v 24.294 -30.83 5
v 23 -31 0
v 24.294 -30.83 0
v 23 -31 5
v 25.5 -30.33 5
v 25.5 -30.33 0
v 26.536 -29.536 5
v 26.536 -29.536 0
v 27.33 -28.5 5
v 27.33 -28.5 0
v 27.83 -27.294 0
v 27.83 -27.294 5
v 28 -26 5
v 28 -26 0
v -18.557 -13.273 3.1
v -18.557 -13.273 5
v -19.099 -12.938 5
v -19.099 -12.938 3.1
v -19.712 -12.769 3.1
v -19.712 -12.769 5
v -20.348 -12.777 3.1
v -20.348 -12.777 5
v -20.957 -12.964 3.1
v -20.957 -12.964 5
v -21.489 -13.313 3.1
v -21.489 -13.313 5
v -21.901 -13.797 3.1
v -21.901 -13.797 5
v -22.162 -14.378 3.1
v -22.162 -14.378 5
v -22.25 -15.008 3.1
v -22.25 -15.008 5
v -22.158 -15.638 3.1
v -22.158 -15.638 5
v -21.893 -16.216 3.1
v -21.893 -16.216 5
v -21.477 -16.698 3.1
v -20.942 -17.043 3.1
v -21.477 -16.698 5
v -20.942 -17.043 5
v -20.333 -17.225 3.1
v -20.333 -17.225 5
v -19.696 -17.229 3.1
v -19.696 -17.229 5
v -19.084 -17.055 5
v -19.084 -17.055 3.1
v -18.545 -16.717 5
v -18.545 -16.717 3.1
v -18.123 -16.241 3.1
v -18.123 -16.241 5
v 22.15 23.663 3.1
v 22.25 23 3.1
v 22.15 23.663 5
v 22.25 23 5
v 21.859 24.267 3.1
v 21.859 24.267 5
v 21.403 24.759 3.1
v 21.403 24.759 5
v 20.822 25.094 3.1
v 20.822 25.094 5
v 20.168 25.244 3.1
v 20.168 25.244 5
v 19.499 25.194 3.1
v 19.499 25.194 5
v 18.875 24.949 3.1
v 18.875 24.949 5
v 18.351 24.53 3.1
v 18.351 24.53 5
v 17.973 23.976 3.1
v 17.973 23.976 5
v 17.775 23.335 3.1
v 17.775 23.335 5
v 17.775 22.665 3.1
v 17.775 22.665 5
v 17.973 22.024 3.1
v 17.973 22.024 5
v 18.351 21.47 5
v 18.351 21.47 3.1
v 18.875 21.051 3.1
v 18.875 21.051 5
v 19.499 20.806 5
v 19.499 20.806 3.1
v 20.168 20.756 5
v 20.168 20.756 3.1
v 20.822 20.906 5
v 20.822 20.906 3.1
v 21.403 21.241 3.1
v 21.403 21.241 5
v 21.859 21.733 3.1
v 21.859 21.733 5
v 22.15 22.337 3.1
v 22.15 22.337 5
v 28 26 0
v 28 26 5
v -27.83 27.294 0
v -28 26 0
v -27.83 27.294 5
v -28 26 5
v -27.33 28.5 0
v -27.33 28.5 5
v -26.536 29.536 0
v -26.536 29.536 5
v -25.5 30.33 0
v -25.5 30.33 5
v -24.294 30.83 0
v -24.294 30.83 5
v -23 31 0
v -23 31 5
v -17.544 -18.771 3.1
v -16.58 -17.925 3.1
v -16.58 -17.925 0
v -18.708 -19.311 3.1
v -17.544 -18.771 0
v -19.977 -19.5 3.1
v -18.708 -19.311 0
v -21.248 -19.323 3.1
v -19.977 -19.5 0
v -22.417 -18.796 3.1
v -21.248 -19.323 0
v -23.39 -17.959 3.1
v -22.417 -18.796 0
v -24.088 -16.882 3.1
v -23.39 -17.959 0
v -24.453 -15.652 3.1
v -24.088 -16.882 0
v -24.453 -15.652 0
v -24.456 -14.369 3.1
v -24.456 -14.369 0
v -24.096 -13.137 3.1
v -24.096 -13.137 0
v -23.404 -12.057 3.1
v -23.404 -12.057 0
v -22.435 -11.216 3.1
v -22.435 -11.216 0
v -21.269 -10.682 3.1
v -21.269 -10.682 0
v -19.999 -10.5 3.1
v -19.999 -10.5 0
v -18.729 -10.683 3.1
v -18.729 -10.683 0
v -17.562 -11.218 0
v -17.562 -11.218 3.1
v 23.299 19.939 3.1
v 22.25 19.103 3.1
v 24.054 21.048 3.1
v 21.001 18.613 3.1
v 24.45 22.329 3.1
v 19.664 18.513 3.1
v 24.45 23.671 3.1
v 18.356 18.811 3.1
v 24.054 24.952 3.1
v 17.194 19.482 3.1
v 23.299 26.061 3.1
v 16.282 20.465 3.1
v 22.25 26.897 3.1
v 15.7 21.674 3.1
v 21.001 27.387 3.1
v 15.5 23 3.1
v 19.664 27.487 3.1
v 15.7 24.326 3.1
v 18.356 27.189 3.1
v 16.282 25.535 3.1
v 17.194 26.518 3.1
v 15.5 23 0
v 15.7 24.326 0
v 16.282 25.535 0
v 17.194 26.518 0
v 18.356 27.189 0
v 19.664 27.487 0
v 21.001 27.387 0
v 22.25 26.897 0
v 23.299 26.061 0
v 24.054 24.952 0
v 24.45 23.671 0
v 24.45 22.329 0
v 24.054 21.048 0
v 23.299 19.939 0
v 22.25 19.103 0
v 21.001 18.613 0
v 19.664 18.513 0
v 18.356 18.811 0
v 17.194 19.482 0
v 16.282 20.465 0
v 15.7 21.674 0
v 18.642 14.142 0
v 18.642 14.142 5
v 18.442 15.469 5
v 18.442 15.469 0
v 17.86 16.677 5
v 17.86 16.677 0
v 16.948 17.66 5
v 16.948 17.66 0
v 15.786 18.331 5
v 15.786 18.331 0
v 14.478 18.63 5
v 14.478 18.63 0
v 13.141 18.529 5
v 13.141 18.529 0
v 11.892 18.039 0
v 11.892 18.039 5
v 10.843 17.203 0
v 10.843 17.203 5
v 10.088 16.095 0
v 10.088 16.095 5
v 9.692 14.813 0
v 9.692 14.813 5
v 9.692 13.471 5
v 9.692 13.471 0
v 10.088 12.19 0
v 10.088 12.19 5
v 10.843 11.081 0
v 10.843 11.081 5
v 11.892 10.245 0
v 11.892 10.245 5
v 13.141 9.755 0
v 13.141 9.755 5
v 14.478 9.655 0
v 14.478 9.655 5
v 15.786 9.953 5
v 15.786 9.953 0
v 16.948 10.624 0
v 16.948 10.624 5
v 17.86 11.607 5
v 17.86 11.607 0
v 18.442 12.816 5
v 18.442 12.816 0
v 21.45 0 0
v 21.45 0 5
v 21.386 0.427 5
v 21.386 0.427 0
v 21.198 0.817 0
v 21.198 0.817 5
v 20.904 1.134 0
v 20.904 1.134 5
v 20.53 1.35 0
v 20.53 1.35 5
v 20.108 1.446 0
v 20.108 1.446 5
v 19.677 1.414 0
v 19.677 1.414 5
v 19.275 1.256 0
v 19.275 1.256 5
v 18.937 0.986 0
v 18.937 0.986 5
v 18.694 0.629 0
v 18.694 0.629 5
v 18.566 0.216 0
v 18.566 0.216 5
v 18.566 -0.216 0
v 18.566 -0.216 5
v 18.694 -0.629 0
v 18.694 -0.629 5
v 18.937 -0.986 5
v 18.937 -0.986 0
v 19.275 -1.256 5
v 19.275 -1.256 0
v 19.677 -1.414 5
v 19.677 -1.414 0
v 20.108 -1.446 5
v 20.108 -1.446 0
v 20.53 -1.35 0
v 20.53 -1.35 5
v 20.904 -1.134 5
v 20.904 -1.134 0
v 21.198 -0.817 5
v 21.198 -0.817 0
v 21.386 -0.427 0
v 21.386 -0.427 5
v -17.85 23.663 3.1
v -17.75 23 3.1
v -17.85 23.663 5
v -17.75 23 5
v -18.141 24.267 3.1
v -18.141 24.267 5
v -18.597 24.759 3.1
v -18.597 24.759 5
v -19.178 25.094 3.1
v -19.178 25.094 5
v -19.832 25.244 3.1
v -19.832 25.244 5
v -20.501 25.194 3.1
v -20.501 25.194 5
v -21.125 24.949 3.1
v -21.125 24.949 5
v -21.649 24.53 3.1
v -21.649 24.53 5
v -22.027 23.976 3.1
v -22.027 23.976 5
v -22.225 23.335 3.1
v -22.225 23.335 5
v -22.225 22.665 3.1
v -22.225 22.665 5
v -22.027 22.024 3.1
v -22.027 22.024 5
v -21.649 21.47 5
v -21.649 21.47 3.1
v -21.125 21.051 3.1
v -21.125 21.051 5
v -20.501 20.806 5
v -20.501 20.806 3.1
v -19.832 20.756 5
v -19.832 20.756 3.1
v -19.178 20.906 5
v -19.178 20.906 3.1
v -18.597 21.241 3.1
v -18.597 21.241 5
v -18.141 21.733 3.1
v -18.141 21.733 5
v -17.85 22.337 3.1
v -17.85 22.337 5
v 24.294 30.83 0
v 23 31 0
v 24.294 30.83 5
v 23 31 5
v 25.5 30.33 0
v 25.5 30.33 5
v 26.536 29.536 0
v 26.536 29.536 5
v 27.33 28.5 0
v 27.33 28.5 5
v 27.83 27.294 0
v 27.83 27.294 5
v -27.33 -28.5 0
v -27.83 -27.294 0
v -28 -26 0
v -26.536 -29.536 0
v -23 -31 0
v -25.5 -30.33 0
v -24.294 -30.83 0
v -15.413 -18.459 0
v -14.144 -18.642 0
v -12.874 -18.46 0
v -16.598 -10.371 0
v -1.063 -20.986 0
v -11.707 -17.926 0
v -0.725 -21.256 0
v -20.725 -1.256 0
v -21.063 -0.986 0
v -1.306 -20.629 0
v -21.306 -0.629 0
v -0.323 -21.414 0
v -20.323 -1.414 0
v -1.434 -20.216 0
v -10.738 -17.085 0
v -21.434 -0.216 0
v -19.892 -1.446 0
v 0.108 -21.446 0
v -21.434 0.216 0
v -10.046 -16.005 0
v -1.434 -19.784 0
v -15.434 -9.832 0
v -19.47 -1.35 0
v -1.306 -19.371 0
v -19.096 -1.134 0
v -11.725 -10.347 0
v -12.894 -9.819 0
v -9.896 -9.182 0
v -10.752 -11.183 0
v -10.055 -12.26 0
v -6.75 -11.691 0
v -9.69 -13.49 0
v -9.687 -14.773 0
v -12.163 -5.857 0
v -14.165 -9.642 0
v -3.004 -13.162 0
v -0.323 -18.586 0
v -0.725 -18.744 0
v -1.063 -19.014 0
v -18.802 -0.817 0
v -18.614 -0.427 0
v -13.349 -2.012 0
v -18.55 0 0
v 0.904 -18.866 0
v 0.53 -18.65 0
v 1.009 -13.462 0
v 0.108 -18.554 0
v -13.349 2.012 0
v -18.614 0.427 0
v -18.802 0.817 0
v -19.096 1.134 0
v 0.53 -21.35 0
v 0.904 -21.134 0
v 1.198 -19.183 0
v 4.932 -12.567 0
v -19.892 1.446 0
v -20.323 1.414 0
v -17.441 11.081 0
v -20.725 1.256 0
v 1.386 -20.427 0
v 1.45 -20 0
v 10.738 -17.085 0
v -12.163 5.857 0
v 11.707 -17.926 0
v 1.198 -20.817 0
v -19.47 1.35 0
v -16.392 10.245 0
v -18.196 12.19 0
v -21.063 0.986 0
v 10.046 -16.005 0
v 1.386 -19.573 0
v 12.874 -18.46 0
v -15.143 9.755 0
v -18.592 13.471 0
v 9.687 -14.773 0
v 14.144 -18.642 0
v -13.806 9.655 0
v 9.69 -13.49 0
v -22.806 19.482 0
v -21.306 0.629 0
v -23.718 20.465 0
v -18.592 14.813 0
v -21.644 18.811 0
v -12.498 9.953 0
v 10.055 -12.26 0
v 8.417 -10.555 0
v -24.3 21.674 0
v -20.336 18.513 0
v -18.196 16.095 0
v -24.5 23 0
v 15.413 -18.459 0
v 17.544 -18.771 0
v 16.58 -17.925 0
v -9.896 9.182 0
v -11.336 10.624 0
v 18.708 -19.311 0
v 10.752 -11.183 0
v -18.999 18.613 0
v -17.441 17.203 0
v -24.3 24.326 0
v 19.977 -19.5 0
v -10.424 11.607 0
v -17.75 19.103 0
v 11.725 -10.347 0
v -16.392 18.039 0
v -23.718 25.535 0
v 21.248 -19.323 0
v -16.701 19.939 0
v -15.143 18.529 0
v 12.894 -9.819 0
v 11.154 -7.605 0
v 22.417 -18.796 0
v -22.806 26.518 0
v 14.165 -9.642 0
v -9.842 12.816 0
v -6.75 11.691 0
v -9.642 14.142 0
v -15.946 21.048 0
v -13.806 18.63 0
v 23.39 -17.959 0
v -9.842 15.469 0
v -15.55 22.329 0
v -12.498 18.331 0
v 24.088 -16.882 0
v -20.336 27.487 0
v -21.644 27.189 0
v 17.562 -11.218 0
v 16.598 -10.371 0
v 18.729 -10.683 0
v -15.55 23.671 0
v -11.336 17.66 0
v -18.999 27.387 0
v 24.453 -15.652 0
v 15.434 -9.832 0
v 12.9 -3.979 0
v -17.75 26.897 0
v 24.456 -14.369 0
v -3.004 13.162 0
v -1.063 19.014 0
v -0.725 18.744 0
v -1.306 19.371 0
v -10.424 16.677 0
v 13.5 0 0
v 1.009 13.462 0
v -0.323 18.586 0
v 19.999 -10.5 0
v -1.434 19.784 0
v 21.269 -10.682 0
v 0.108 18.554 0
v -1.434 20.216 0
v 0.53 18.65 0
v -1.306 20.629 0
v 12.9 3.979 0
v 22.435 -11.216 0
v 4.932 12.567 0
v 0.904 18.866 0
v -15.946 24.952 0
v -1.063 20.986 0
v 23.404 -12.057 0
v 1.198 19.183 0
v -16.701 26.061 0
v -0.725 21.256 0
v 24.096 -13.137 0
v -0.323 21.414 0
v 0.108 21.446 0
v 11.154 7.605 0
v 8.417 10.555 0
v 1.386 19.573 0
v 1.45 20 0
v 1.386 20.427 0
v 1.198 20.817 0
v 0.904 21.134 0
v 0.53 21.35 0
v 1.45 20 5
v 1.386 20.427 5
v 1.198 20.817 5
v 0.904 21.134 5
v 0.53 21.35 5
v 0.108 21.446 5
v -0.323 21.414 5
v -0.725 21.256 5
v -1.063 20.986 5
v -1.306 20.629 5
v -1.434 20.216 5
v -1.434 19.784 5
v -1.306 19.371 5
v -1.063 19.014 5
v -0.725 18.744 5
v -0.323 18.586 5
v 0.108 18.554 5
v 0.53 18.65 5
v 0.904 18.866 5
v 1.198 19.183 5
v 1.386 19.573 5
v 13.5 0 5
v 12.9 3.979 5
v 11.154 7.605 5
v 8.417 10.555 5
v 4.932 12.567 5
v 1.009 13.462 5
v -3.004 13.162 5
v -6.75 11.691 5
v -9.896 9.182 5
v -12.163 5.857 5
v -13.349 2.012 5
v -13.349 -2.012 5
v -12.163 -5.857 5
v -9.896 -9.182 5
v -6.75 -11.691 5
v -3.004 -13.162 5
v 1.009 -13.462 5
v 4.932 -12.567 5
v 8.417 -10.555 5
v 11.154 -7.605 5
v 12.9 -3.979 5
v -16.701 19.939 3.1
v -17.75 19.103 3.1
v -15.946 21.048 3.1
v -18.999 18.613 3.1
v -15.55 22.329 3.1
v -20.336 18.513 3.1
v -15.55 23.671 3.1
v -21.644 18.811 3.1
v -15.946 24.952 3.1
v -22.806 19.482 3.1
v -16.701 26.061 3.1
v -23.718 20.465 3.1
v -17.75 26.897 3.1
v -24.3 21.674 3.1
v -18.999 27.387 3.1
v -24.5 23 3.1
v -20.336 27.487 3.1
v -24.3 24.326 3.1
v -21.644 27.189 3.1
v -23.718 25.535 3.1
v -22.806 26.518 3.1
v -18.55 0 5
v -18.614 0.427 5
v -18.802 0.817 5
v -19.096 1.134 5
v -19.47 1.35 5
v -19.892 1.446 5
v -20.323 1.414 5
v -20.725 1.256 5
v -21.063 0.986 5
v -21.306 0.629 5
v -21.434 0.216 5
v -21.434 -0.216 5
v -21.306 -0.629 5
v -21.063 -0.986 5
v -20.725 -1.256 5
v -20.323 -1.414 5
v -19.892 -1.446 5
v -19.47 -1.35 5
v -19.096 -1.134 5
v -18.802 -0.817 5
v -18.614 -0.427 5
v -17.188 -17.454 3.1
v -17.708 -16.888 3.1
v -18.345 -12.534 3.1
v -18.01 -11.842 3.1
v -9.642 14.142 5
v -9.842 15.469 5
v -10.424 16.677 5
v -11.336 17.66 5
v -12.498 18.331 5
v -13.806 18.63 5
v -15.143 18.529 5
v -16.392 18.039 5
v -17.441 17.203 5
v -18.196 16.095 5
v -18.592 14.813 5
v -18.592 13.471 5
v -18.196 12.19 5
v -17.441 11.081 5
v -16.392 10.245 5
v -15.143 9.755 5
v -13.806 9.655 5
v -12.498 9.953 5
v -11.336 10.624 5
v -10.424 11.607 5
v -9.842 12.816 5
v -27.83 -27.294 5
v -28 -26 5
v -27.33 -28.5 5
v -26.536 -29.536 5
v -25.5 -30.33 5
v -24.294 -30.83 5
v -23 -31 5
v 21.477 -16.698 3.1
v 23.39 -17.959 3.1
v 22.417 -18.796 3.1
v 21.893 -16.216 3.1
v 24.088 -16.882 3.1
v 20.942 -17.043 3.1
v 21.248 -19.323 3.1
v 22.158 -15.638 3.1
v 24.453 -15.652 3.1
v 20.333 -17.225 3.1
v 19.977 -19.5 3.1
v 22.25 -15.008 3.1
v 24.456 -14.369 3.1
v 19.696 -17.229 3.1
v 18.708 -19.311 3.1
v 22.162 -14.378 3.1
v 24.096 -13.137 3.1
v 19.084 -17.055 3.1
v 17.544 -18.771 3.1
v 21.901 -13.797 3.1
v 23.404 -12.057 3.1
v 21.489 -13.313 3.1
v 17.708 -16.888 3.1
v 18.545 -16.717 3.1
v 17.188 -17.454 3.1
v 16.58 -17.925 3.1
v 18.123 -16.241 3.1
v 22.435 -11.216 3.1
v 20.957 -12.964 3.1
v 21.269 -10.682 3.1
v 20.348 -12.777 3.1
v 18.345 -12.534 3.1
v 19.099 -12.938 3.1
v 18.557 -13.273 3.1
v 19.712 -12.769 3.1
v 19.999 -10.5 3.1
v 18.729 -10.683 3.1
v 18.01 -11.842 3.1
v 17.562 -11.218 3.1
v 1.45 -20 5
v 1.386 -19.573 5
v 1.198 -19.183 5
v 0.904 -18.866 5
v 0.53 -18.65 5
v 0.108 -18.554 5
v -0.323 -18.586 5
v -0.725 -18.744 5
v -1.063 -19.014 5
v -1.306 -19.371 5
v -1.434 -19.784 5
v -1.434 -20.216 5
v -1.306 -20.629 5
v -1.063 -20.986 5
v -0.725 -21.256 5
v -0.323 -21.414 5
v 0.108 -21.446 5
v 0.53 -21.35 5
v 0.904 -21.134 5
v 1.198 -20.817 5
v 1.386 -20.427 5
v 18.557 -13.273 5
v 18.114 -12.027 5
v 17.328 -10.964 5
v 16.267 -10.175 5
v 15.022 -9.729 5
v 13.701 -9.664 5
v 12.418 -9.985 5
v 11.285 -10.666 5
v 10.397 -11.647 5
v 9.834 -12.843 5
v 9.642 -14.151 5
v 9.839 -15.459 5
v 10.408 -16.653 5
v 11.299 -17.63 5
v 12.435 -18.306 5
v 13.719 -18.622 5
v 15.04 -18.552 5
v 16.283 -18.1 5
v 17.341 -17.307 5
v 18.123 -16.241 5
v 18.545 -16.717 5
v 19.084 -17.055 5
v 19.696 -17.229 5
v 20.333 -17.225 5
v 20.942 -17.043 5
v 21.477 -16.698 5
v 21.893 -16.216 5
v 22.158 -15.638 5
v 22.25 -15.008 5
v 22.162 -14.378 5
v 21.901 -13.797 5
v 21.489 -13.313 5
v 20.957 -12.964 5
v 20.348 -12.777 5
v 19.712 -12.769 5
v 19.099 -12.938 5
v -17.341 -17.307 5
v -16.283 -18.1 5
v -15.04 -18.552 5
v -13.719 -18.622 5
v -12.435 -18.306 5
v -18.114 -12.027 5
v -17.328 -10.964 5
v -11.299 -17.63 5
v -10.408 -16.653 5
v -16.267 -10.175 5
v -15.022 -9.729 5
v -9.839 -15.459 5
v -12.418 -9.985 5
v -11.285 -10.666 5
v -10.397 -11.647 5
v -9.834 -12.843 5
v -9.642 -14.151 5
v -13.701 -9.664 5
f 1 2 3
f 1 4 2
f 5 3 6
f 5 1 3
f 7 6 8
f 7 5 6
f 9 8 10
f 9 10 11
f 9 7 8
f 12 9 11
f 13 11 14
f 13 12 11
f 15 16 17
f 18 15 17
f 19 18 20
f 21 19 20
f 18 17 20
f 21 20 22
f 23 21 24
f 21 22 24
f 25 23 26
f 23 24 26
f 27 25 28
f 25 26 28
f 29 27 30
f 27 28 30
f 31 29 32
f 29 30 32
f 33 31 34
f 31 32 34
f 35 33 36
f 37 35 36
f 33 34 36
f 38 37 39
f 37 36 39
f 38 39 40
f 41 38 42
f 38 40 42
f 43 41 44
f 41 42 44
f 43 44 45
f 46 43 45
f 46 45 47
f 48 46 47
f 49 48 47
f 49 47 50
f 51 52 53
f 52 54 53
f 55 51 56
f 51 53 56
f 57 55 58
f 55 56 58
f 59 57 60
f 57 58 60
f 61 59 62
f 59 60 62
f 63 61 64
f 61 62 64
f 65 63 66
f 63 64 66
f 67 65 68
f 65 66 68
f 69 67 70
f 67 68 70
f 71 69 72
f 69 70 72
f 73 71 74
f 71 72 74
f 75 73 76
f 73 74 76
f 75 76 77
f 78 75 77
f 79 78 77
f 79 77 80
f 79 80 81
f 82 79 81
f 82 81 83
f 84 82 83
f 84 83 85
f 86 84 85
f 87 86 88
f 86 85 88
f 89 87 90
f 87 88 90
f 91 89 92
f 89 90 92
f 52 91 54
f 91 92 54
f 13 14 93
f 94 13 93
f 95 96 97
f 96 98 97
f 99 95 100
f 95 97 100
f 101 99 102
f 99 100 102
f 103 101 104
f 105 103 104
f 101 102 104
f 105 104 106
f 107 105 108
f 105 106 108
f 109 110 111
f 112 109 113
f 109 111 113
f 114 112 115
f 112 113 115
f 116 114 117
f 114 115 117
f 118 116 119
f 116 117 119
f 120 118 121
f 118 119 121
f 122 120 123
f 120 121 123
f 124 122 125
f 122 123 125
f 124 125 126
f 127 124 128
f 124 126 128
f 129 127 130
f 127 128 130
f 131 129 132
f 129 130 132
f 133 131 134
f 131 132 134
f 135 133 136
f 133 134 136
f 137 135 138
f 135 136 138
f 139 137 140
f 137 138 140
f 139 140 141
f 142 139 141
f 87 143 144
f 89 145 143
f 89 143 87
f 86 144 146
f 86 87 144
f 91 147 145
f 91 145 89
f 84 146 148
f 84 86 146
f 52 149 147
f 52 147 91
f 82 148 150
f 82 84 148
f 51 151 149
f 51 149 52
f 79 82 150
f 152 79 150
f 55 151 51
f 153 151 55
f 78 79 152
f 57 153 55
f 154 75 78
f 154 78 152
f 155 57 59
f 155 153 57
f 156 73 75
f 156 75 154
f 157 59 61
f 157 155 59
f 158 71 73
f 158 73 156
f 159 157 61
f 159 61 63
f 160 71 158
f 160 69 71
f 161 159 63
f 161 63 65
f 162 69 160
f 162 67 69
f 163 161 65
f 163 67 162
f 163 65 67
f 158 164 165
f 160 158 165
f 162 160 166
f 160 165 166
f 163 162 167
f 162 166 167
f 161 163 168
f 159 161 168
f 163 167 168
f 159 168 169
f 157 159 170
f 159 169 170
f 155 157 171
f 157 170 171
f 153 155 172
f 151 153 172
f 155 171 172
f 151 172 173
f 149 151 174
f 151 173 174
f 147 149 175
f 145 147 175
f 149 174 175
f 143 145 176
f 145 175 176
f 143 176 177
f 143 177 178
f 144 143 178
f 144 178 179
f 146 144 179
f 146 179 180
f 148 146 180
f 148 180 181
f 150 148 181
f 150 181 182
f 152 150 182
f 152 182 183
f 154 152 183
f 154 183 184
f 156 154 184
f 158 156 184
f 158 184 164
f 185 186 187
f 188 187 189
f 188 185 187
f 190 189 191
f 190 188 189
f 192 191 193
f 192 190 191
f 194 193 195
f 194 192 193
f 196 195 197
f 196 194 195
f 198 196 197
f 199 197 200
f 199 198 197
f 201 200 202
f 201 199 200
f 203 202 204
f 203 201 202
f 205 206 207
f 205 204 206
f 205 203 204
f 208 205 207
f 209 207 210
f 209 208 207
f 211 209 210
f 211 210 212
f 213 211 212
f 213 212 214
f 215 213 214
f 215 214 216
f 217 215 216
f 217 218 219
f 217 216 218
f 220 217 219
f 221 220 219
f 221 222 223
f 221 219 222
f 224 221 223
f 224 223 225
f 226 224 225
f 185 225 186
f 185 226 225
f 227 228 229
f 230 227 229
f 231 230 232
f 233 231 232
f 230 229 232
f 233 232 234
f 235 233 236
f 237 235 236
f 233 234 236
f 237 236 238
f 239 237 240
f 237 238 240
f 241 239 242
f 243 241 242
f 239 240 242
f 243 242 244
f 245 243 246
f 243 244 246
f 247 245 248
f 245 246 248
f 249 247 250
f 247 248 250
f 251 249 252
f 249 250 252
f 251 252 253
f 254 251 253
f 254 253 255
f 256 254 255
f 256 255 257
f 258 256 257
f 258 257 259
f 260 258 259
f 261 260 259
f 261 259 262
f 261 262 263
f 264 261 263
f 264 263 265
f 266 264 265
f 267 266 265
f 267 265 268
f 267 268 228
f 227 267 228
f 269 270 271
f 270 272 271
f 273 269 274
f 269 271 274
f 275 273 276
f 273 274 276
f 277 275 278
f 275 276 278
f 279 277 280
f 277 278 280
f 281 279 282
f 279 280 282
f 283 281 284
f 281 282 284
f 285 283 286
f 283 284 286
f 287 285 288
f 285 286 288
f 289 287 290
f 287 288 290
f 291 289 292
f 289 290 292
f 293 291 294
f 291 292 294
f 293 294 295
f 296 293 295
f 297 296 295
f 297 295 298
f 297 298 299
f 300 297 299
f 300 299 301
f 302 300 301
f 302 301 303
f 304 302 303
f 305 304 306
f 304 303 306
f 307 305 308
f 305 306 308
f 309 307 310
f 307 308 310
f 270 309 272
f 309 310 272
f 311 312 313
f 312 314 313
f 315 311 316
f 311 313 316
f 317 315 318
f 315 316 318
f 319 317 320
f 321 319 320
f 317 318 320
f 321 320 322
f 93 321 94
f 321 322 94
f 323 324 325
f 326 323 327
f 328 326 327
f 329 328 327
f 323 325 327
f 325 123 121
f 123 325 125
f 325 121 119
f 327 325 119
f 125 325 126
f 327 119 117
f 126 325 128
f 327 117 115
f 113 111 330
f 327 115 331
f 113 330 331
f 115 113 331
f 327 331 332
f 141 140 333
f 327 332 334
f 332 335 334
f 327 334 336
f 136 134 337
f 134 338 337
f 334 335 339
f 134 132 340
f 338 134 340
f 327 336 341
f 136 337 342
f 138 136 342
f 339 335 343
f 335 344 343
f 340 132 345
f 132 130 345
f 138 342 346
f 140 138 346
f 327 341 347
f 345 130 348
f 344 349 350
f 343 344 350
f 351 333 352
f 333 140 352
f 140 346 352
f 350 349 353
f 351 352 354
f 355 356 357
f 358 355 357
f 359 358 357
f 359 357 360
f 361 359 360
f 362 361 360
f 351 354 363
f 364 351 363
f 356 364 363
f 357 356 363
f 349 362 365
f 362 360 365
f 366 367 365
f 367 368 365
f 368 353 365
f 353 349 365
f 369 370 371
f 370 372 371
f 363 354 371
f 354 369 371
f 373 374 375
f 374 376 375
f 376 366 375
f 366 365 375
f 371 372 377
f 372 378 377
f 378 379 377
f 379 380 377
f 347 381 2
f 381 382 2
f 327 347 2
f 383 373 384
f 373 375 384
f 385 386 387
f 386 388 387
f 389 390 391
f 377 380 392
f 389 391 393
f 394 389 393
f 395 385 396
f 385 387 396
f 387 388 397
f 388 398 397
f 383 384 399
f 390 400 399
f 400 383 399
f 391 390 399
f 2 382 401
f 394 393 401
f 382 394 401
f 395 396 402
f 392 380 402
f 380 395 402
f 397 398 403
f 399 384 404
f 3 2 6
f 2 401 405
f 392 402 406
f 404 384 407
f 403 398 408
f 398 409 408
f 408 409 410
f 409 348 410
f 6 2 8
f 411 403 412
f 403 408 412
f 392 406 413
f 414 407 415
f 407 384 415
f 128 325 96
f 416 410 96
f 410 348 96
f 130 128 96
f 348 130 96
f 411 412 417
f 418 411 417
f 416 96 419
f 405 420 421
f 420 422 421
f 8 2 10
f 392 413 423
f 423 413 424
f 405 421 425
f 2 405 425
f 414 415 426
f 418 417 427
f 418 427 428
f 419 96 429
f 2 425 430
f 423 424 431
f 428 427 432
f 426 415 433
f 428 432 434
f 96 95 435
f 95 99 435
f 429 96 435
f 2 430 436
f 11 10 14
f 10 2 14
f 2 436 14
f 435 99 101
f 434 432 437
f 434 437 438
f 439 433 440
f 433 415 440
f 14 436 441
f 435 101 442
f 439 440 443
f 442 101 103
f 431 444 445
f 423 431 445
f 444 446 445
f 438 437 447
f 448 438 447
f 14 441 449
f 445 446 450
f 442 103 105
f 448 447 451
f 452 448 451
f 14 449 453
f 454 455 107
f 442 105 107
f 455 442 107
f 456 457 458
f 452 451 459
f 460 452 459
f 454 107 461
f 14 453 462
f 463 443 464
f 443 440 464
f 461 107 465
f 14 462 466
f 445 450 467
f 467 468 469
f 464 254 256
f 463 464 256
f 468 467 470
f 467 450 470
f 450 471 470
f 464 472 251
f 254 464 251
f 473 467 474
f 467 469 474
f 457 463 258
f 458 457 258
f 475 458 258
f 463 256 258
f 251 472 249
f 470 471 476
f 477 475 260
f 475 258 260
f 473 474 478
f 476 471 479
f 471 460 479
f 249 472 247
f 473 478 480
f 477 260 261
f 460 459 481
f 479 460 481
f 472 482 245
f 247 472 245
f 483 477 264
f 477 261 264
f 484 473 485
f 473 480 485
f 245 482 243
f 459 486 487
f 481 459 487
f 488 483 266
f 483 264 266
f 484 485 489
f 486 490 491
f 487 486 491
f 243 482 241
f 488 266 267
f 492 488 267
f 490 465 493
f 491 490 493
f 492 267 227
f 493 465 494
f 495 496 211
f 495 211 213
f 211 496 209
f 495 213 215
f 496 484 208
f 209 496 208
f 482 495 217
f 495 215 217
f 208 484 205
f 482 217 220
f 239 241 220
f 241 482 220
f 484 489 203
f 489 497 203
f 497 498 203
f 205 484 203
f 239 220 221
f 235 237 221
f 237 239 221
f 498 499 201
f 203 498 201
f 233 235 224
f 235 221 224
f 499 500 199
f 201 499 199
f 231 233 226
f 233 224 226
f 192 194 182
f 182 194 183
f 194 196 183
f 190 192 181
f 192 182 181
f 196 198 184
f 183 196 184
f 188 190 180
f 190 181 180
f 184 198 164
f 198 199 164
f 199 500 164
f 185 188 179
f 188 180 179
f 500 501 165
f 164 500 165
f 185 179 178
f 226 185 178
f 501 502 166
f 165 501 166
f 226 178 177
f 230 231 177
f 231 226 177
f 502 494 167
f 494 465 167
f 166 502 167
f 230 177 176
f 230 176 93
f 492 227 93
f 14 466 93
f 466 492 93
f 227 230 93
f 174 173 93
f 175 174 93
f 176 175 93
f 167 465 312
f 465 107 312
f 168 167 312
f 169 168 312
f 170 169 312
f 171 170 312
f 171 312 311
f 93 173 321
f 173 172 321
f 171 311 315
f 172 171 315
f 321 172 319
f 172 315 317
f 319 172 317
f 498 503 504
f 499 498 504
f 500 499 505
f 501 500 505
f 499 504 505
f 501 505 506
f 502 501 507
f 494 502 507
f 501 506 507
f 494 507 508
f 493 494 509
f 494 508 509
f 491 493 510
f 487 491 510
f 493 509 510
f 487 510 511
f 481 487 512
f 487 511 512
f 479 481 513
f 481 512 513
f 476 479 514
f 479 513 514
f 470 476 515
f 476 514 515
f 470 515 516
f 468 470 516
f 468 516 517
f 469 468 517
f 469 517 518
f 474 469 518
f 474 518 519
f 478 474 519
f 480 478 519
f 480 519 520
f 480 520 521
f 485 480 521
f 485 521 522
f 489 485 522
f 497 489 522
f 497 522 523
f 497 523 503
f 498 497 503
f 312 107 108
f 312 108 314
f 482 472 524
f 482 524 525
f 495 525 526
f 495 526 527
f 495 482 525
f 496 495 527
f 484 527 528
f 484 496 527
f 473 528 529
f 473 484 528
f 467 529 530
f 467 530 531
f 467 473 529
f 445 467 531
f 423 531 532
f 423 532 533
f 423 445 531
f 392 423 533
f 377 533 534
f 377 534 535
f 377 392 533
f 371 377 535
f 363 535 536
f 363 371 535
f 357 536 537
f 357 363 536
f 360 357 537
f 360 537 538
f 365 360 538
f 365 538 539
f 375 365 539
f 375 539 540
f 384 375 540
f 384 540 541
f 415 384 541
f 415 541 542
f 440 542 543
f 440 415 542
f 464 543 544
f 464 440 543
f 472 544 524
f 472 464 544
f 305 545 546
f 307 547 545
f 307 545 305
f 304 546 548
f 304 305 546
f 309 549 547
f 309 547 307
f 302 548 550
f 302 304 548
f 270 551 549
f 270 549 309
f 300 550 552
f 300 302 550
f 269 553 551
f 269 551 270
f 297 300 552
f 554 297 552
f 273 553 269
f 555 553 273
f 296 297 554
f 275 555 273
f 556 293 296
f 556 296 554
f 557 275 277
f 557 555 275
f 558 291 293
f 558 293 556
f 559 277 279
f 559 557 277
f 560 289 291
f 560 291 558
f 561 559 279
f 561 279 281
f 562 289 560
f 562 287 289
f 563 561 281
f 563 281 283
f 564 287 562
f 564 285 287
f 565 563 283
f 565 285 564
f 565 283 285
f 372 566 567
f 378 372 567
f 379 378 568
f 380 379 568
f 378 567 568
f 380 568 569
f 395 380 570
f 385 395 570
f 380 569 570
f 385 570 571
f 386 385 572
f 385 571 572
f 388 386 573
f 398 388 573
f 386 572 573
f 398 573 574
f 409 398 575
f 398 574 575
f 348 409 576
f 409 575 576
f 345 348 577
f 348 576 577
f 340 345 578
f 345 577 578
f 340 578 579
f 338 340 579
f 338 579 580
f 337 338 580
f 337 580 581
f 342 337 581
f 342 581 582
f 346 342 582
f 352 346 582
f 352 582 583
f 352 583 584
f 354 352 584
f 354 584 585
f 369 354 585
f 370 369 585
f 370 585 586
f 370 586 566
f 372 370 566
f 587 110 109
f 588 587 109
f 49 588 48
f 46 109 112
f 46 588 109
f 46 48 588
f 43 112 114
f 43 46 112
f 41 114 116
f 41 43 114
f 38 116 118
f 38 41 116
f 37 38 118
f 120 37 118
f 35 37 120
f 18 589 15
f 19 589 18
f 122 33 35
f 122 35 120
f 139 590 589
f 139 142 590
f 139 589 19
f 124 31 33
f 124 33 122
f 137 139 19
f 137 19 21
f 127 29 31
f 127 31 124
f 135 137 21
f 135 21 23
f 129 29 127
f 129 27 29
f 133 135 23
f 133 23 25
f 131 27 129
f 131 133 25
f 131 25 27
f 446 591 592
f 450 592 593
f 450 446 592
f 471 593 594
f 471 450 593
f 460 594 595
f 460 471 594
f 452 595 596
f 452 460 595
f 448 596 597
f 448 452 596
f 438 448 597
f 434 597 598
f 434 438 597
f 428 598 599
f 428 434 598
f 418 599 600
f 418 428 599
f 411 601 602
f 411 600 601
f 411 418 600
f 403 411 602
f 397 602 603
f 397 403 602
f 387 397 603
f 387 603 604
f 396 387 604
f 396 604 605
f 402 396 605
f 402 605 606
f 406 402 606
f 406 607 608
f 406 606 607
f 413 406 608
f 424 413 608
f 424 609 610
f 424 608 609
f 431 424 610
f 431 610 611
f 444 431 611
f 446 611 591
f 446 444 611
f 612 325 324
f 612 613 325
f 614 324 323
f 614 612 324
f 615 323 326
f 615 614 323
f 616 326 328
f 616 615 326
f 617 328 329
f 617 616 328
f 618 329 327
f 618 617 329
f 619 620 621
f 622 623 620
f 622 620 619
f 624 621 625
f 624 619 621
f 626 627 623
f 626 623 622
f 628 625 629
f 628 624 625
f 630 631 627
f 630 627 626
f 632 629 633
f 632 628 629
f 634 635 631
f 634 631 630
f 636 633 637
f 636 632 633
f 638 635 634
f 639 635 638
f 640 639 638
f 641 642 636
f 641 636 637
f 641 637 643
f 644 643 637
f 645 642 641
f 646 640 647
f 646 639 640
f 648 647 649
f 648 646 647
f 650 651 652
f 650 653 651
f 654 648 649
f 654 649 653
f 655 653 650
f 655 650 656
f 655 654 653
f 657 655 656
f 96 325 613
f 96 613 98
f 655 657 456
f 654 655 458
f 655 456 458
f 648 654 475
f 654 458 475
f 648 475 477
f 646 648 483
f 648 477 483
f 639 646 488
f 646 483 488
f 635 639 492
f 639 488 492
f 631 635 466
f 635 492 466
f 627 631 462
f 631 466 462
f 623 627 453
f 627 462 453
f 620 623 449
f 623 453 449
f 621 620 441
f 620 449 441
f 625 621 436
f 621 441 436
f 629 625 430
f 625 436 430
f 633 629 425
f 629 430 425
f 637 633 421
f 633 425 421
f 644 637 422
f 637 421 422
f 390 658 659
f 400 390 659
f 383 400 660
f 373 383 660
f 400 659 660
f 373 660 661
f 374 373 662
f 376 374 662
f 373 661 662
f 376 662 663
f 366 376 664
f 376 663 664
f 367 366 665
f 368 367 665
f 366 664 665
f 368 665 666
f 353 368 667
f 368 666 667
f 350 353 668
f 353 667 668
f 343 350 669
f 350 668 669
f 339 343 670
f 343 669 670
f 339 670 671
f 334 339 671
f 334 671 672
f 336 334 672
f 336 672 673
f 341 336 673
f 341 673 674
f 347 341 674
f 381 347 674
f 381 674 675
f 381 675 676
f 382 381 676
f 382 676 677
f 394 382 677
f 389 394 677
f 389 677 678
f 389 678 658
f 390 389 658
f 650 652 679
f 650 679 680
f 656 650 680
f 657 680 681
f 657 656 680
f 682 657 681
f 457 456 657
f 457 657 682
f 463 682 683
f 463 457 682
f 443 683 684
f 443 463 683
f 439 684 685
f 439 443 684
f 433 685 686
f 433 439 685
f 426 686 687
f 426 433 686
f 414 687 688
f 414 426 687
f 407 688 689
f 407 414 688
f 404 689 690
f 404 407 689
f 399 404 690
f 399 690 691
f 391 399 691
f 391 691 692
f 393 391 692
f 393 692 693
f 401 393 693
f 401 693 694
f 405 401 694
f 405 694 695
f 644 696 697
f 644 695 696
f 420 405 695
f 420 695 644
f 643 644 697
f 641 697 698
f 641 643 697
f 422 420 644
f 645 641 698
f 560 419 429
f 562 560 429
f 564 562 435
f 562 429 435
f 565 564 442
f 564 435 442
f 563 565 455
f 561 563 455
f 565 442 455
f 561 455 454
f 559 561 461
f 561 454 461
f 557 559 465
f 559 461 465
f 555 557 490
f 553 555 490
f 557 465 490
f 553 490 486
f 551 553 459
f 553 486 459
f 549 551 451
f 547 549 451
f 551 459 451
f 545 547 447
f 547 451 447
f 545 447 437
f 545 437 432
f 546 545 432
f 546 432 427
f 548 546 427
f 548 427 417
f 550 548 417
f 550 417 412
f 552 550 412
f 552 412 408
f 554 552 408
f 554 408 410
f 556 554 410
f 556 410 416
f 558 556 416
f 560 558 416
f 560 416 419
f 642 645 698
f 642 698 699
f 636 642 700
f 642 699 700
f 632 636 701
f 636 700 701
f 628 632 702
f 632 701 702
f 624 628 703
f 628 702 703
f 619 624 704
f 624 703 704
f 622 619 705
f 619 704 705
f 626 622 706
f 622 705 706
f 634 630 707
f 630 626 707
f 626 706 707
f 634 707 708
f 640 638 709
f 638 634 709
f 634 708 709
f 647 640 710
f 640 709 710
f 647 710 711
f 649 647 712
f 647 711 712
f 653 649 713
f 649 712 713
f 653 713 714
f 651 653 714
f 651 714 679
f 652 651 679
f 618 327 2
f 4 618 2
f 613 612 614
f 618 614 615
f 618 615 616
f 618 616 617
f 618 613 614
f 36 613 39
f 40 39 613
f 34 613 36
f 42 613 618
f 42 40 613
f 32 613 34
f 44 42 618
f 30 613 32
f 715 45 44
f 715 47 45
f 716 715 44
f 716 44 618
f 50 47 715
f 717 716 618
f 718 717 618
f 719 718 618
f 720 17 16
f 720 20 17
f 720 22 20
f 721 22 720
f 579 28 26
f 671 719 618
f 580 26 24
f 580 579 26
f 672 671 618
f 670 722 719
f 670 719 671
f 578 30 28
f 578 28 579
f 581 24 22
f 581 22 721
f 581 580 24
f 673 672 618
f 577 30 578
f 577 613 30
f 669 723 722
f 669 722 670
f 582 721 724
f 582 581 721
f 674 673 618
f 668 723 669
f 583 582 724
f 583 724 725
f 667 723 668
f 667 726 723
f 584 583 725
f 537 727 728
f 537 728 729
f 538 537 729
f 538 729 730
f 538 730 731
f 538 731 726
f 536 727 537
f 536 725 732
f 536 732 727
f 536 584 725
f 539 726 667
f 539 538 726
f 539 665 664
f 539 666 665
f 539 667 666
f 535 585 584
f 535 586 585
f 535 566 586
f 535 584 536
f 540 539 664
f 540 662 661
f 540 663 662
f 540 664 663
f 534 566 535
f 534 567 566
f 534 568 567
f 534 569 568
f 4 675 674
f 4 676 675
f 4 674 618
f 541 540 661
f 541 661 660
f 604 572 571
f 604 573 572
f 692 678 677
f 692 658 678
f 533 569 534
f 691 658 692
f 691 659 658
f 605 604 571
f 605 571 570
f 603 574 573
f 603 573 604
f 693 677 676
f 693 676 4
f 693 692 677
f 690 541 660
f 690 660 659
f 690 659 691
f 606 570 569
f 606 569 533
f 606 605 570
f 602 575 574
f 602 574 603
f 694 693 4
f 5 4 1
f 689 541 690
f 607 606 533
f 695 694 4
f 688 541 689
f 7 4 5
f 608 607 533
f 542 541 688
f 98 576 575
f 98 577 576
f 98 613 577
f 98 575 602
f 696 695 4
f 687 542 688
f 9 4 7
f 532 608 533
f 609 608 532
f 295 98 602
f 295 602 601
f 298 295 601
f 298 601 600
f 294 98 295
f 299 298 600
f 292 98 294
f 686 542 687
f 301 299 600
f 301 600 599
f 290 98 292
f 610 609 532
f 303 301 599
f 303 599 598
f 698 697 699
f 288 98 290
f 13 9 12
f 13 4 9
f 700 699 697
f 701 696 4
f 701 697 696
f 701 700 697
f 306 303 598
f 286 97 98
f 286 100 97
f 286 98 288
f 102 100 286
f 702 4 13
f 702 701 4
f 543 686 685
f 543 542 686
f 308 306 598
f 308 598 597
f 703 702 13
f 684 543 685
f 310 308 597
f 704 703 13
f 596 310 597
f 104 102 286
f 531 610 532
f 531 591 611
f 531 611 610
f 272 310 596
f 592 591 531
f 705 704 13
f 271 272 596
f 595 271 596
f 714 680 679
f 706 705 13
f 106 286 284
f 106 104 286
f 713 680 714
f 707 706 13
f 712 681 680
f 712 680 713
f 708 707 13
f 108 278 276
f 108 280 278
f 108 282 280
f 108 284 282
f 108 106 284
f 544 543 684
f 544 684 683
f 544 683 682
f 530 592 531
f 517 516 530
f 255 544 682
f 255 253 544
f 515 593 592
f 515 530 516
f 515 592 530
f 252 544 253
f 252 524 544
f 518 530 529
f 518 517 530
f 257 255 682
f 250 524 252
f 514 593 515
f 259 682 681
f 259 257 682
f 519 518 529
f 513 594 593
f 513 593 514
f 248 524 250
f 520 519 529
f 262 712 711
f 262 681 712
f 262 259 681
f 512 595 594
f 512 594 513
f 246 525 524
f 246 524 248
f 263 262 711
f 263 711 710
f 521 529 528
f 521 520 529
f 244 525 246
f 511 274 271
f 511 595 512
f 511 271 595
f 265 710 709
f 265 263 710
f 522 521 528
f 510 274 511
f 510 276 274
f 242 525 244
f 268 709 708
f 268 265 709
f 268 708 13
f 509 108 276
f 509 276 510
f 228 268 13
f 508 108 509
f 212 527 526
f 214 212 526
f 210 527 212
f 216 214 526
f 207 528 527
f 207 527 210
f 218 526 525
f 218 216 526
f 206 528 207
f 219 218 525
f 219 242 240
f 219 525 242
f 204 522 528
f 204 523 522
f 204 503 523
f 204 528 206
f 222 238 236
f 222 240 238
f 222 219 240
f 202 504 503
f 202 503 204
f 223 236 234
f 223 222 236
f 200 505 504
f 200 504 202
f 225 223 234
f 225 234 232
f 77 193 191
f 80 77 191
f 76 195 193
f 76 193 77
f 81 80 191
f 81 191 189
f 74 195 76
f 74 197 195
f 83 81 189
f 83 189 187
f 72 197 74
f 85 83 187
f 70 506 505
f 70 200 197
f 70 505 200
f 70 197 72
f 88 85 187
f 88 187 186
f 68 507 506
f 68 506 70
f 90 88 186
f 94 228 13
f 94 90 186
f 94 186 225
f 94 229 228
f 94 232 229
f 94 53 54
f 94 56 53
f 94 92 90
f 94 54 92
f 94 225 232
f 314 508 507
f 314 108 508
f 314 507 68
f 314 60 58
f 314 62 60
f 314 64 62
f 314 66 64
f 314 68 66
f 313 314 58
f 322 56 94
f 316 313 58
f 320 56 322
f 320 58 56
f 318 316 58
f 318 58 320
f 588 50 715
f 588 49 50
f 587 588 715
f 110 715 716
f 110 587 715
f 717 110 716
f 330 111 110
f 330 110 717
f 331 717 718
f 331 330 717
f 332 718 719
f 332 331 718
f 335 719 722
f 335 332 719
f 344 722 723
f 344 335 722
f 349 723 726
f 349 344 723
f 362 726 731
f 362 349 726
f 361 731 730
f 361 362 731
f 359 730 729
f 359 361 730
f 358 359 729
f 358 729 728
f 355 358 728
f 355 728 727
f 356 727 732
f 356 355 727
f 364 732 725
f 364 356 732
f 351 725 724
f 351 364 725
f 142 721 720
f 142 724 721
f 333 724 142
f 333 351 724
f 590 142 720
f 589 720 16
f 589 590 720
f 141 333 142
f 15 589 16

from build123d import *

# Parameters (mm, degrees)
SKETCH1_W                                        = 56
SKETCH1_H                                        = 62
SKETCH1_R                                        = 13.5
BOSS_EXTRUDE1_DEPTH                              = 5
M2_5_CLEARANCE_HOLE1_D                           = 2.9
CBORE_FOR_M4_PAN_HEAD_MACHINE_SCREW1_D           = 4.5
CBORE_FOR_M4_PAN_HEAD_MACHINE_SCREW1_CBORE_D     = 9
CBORE_FOR_M4_PAN_HEAD_MACHINE_SCREW1_CBORE_DEPTH = 3.1
FILLET1_R                                        = 5
SKETCH6_R                                        = 4.5
CUT_EXTRUDE1_DEPTH                               = 6
CUT_EXTRUDE1_DEPTH_BACK                          = 1


with BuildPart() as part:
    # Sketch1 → Boss-Extrude1 (new body)
    with BuildSketch(Plane.XY):
        Rectangle(SKETCH1_W, SKETCH1_H)
        Circle(SKETCH1_R, mode=Mode.SUBTRACT)
    extrude(amount=BOSS_EXTRUDE1_DEPTH)

    # M2.5 Clearance Hole1 (through all)
    with Locations(Plane(origin=(0, 0, 0), x_dir=(-1, 0, 0), z_dir=(0, 0, -1))):
        with Locations((0, 20), (0, -20), (20, 0), (-20, 0)):
            Hole(M2_5_CLEARANCE_HOLE1_D / 2)

    # CBORE for M4 Pan Head Machine Screw1 (through all)
    with Locations(Plane(origin=(0, 0, 0), x_dir=(-1, 0, 0), z_dir=(0, 0, -1))):
        with Locations((-20, 23), (20, 23), (20, -15), (-20, -15)):
            CounterBoreHole(CBORE_FOR_M4_PAN_HEAD_MACHINE_SCREW1_D / 2, CBORE_FOR_M4_PAN_HEAD_MACHINE_SCREW1_CBORE_D / 2, CBORE_FOR_M4_PAN_HEAD_MACHINE_SCREW1_CBORE_DEPTH)

    # Fillet1
    fillet1_edges = [part.edges().sort_by_distance(p)[0] for p in [
        (28, -31, 2.5),
        (-28, -31, 2.5),
        (-28, 31, 2.5),
        (28, 31, 2.5),
    ]]
    fillet(fillet1_edges, radius=FILLET1_R)

    # Sketch6 → Cut-Extrude1 (cut, two sides)
    with BuildSketch(Plane.XY) as cut_extrude1_sk:
        with Locations((-14.142135624, -14.142135624)):
            Circle(SKETCH6_R)
        with Locations((-14.142135624, 14.142135624)):
            Circle(SKETCH6_R)
        with Locations((14.142135624, 14.142135624)):
            Circle(SKETCH6_R)
        with Locations((14.142135624, -14.142135624)):
            Circle(SKETCH6_R)
    extrude(amount=CUT_EXTRUDE1_DEPTH, mode=Mode.SUBTRACT)
    extrude(cut_extrude1_sk.sketch, amount=-CUT_EXTRUDE1_DEPTH_BACK, mode=Mode.SUBTRACT)


solid = part.part
